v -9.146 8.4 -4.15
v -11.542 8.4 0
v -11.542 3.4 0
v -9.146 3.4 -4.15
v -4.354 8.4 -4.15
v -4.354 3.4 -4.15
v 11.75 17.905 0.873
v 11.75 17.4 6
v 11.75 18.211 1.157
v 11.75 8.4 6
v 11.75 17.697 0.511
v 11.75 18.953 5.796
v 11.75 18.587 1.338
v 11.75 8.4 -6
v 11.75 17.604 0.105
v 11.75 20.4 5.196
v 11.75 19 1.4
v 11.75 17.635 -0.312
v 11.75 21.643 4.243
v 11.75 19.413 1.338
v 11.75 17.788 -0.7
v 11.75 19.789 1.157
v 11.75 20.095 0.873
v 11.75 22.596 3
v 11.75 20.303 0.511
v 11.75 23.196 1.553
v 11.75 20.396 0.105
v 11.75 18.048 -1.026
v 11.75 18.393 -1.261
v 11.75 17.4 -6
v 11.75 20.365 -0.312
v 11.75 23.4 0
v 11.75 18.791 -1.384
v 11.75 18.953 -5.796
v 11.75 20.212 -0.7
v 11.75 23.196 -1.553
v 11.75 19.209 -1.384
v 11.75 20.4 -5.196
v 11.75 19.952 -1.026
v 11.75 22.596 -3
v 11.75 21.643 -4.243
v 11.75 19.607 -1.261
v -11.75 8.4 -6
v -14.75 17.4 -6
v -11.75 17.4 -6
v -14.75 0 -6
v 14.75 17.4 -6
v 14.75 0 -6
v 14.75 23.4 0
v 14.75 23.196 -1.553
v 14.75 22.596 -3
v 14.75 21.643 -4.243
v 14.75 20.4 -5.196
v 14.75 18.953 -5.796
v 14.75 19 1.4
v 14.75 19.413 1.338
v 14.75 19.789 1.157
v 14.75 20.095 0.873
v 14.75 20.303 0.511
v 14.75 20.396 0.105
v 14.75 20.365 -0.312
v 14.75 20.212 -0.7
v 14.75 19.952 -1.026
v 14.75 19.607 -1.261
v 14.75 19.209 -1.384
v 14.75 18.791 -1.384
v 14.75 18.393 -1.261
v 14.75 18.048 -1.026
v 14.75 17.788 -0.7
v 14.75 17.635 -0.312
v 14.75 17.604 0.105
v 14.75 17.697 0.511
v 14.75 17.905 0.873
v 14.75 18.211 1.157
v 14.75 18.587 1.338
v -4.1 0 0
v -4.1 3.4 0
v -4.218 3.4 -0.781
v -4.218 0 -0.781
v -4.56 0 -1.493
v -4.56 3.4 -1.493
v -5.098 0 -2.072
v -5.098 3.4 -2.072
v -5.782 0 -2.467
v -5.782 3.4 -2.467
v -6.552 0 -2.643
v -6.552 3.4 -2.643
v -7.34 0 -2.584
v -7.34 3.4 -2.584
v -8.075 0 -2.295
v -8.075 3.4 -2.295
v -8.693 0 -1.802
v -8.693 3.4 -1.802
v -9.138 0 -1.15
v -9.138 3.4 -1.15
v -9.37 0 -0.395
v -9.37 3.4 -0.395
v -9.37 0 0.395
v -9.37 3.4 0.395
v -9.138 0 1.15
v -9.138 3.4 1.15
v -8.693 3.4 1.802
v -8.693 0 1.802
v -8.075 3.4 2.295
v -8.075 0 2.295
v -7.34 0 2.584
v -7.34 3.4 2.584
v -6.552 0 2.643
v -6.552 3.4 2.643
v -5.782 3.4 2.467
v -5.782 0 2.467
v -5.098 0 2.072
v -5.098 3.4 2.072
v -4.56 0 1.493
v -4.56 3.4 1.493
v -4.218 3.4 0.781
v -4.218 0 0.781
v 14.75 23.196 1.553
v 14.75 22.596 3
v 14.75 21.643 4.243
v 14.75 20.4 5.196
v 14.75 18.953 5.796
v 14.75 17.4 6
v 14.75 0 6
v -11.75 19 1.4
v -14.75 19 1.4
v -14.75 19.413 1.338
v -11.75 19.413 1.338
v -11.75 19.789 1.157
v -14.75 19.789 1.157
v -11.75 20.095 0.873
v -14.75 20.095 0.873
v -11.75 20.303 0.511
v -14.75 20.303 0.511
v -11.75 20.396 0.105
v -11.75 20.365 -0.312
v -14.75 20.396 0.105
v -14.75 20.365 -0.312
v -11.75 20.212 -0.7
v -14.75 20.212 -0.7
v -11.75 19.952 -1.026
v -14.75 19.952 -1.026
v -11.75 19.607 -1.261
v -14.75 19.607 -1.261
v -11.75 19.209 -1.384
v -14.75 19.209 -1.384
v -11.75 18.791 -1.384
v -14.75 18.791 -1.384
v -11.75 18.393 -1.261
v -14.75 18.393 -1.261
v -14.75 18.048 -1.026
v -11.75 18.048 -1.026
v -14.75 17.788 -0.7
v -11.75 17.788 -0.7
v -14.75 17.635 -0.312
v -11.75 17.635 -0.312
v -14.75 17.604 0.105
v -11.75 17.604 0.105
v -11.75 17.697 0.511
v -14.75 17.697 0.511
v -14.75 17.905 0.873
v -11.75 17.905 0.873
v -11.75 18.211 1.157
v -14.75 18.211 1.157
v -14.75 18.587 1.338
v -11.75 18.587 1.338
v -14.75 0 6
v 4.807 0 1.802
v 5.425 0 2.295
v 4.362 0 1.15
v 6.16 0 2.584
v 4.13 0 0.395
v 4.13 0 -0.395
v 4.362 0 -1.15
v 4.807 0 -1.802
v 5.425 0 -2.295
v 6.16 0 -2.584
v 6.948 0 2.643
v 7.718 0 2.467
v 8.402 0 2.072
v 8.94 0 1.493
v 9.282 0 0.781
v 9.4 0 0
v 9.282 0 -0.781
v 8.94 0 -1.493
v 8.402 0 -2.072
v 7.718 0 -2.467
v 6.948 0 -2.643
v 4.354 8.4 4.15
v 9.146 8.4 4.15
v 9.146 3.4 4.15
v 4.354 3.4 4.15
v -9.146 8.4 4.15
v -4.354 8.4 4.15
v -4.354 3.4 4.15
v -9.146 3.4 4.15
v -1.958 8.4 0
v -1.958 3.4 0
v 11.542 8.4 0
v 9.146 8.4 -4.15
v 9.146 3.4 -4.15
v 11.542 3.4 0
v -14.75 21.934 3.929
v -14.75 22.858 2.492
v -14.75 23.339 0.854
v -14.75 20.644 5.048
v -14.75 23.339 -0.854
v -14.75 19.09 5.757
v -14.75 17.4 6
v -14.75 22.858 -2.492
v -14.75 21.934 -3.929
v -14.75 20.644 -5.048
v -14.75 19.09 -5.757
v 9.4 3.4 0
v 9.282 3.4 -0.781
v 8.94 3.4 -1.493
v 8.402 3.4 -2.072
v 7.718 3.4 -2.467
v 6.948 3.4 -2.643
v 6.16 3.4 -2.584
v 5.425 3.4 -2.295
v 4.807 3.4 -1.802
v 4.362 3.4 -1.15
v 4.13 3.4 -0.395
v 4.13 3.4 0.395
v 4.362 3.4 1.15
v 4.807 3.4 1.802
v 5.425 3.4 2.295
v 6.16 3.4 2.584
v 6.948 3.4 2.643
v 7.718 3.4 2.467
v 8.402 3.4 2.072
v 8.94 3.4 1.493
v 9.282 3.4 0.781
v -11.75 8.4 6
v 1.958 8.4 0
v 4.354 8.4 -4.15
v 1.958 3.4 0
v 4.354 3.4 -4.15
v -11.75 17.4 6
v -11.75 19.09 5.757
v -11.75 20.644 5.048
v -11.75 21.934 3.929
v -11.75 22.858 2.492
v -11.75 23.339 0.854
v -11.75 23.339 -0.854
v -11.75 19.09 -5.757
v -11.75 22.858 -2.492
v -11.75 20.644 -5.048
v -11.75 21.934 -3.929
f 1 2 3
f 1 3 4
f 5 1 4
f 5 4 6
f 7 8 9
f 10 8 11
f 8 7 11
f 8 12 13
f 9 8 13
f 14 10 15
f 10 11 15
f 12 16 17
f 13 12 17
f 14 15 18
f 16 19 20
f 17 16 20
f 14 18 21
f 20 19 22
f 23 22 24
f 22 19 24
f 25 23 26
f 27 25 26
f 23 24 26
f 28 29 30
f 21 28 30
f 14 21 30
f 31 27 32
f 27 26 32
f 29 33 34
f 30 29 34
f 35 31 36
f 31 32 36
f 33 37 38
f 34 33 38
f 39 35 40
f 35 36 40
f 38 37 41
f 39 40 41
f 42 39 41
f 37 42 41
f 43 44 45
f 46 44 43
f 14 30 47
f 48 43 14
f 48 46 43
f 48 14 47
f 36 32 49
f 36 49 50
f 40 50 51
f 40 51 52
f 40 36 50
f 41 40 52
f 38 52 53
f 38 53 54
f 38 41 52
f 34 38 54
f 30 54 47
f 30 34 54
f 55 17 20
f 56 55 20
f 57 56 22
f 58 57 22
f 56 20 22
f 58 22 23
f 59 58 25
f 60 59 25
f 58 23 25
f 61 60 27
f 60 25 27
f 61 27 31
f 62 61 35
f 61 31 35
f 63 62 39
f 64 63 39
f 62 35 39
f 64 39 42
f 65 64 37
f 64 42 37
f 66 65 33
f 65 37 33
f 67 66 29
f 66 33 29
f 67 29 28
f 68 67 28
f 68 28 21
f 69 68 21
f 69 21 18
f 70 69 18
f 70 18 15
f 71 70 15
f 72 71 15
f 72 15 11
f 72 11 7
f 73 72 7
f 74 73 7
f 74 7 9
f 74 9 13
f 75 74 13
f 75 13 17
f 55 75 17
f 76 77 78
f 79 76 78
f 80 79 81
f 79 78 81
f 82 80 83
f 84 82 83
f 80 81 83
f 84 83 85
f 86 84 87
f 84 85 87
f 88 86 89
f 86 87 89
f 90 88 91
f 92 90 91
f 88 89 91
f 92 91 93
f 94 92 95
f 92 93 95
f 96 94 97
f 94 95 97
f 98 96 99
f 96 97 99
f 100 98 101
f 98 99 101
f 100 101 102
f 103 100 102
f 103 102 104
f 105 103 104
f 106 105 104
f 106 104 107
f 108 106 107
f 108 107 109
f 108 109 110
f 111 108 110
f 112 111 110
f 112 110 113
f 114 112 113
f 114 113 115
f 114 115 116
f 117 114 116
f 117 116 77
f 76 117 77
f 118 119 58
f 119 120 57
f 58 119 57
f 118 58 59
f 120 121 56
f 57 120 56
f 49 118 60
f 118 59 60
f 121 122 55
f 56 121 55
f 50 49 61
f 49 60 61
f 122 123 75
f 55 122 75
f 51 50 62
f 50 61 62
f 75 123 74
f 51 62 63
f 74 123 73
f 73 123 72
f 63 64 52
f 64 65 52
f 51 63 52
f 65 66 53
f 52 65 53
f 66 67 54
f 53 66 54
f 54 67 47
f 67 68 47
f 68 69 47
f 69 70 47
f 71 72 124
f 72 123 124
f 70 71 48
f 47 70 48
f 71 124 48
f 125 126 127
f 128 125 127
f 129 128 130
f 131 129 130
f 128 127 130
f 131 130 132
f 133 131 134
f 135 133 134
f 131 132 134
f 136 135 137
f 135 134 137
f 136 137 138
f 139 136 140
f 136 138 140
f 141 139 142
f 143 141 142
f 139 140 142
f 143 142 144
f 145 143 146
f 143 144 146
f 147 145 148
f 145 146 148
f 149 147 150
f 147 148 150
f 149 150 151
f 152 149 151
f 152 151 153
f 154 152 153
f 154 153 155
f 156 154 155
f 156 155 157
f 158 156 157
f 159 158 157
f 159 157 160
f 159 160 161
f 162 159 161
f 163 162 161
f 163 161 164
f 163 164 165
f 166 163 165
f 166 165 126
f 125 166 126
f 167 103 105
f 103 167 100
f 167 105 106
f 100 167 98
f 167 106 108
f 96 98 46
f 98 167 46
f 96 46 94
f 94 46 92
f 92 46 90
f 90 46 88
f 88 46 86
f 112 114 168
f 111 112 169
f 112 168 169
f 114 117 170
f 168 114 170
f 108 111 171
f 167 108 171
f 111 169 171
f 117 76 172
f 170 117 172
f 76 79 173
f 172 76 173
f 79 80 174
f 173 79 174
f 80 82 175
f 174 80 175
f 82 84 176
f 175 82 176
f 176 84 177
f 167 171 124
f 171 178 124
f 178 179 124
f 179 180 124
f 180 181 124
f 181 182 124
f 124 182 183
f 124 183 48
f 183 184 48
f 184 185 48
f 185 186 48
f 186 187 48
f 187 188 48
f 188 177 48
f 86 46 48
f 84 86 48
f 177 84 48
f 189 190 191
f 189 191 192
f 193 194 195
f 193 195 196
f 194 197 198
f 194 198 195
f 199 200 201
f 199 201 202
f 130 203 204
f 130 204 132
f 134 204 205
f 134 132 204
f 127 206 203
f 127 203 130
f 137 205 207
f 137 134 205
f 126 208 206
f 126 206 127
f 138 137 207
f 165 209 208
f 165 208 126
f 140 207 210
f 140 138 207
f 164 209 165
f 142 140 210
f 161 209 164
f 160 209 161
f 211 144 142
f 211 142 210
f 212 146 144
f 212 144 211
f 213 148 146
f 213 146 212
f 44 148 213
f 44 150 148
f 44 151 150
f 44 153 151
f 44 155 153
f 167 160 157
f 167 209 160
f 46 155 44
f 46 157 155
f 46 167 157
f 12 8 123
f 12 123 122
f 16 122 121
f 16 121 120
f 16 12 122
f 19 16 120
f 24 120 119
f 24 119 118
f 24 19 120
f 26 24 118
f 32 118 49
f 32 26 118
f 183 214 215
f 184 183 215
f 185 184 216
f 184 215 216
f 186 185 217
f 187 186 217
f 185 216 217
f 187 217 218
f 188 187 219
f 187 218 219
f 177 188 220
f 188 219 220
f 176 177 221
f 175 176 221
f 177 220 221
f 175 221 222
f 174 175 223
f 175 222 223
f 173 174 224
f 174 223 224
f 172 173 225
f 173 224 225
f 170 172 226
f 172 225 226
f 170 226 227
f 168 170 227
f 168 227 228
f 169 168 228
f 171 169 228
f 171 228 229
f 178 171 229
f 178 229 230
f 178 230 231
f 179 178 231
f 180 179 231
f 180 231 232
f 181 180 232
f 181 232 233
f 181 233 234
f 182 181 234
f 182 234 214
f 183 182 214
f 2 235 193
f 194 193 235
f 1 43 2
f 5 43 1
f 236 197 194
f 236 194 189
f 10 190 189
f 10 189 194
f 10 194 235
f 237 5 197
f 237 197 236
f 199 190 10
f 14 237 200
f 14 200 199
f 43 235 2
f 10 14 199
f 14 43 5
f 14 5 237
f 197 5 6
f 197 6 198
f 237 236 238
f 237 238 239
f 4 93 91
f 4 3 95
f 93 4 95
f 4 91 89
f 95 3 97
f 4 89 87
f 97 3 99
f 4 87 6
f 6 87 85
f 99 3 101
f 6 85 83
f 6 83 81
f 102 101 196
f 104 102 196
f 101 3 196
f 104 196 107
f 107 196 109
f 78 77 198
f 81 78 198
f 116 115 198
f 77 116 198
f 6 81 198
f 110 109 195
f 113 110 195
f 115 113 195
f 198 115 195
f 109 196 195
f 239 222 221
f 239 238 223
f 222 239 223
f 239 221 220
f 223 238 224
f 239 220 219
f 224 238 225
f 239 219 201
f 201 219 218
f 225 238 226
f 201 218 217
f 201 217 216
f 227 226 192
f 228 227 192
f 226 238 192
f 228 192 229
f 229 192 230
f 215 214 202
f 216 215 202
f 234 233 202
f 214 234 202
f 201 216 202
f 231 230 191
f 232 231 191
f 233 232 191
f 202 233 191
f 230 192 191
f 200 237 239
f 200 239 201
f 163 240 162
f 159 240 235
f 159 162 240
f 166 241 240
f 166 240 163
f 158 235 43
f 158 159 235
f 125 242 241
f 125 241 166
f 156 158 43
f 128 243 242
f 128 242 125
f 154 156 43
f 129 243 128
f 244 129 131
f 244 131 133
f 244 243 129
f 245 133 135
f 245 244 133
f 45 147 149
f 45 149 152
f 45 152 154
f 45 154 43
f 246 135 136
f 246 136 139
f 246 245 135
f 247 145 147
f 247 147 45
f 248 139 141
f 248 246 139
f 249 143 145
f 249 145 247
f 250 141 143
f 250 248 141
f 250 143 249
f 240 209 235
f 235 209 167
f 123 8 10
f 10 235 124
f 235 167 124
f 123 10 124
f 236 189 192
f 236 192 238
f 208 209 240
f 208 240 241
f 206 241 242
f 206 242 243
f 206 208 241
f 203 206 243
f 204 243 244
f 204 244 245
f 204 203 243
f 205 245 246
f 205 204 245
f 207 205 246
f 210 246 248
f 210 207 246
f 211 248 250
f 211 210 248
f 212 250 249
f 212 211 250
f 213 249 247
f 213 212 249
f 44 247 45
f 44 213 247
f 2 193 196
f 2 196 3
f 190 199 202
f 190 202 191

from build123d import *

# Parameters (mm, degrees)
SKETCH_1_W          = 29.5
SKETCH_1_H          = 12
EXTRUDE_1_DEPTH     = 23.4
SKETCH_3_W          = 23.5
SKETCH_3_H          = 12
CUT_EXTRUDE_1_DEPTH = 15
SKETCH_4_R          = 1.4
CUT_EXTRUDE_2_DEPTH = 39.12886046
FILLET_1_RADIUS     = 6
FILLET_1_LENGTH     = 3
MIRROR_START        = 11.75
MIRROR_1_DEPTH      = 3
HOLE_WIZARD_M5_1_D  = 5.3
CUT_EXTRUDE_4_DEPTH = 5


# Read off the part's stored shape, not the designer's step: 镜向1
with BuildPart() as part:
    # 草图1 → 凸台-拉伸1 (new body)
    with BuildSketch(Plane(origin=(0, 0, 0), x_dir=(1, 0, 0), z_dir=(0, 1, 0))):
        Rectangle(SKETCH_1_W, SKETCH_1_H)
    extrude(amount=EXTRUDE_1_DEPTH)

    # 草图3 → 切除-拉伸1 (cut)
    with BuildSketch(Plane(origin=(0, 23.4, 0), x_dir=(1, 0, 0), z_dir=(0, 1, 0))):
        Rectangle(SKETCH_3_W, SKETCH_3_H)
    extrude(amount=-CUT_EXTRUDE_1_DEPTH, mode=Mode.SUBTRACT)

    # 草图4 → 切除-拉伸2 (cut, through all)
    with BuildSketch(Plane.ZY.offset(14.75)):
        with Locations((0, 19)):
            Circle(SKETCH_4_R)
    extrude(amount=-CUT_EXTRUDE_2_DEPTH, mode=Mode.SUBTRACT)

    # 圆角1: full round fillet: the end face becomes a half cylinder, R = half its width
    fillet_1_face = Plane((-13.25, 23.4, 0), x_dir=(-1, 0, 0), z_dir=(0, 1, 0))  # on the end face: x along it, z out of the body
    fillet_1_slab = fillet_1_face.offset(-FILLET_1_RADIUS / 2) * Box(FILLET_1_LENGTH, 2 * FILLET_1_RADIUS, FILLET_1_RADIUS, mode=Mode.PRIVATE)  # the body's end, R deep
    fillet_1_round = Plane((-13.25, 17.4, 0), x_dir=(0, 1, 0), z_dir=(-1, 0, 0)) * Cylinder(FILLET_1_RADIUS, FILLET_1_LENGTH, mode=Mode.PRIVATE)  # its axis R under the face
    add(fillet_1_slab - fillet_1_round, mode=Mode.SUBTRACT)

    # 镜向1 outline → 镜向1 (cut)
    with BuildSketch(Plane.YZ.offset(MIRROR_START)):
        with BuildLine():
            Line((23.4, 6), (17.4, 6))
            ThreePointArc((17.4, 6), (21.642640687, 4.242640687), (23.4, 0))
            Line((23.4, 0), (23.4, 6))
        make_face()
        with BuildLine():
            Line((23.4, -6), (23.4, 0))
            ThreePointArc((23.4, 0), (21.642640687, -4.242640687), (17.4, -6))
            Line((17.4, -6), (23.4, -6))
        make_face()
    extrude(amount=MIRROR_1_DEPTH, mode=Mode.SUBTRACT)

    # M5 间隙孔1 (through all)
    with Locations(Plane(origin=(0, 0, 0), x_dir=(-1, 0, 0), z_dir=(0, -1, 0))):
        with Locations((-6.75, 0), (6.75, 0)):
            Hole(HOLE_WIZARD_M5_1_D / 2)

    # 草图10 → 切除-拉伸4 (cut)
    with BuildSketch(Plane.XZ.offset(-8.4)):
        Polygon((1.957992766, 0), (4.353996383, -4.15), (9.146003617, -4.15), (11.542007234, 0), (9.146003617, 4.15), (4.353996383, 4.15), align=None)
        Polygon((-11.542007234, 0), (-9.146003617, -4.15), (-4.353996383, -4.15), (-1.957992766, 0), (-4.353996383, 4.15), (-9.146003617, 4.15), align=None)
    extrude(amount=CUT_EXTRUDE_4_DEPTH, mode=Mode.SUBTRACT)


solid = part.part
